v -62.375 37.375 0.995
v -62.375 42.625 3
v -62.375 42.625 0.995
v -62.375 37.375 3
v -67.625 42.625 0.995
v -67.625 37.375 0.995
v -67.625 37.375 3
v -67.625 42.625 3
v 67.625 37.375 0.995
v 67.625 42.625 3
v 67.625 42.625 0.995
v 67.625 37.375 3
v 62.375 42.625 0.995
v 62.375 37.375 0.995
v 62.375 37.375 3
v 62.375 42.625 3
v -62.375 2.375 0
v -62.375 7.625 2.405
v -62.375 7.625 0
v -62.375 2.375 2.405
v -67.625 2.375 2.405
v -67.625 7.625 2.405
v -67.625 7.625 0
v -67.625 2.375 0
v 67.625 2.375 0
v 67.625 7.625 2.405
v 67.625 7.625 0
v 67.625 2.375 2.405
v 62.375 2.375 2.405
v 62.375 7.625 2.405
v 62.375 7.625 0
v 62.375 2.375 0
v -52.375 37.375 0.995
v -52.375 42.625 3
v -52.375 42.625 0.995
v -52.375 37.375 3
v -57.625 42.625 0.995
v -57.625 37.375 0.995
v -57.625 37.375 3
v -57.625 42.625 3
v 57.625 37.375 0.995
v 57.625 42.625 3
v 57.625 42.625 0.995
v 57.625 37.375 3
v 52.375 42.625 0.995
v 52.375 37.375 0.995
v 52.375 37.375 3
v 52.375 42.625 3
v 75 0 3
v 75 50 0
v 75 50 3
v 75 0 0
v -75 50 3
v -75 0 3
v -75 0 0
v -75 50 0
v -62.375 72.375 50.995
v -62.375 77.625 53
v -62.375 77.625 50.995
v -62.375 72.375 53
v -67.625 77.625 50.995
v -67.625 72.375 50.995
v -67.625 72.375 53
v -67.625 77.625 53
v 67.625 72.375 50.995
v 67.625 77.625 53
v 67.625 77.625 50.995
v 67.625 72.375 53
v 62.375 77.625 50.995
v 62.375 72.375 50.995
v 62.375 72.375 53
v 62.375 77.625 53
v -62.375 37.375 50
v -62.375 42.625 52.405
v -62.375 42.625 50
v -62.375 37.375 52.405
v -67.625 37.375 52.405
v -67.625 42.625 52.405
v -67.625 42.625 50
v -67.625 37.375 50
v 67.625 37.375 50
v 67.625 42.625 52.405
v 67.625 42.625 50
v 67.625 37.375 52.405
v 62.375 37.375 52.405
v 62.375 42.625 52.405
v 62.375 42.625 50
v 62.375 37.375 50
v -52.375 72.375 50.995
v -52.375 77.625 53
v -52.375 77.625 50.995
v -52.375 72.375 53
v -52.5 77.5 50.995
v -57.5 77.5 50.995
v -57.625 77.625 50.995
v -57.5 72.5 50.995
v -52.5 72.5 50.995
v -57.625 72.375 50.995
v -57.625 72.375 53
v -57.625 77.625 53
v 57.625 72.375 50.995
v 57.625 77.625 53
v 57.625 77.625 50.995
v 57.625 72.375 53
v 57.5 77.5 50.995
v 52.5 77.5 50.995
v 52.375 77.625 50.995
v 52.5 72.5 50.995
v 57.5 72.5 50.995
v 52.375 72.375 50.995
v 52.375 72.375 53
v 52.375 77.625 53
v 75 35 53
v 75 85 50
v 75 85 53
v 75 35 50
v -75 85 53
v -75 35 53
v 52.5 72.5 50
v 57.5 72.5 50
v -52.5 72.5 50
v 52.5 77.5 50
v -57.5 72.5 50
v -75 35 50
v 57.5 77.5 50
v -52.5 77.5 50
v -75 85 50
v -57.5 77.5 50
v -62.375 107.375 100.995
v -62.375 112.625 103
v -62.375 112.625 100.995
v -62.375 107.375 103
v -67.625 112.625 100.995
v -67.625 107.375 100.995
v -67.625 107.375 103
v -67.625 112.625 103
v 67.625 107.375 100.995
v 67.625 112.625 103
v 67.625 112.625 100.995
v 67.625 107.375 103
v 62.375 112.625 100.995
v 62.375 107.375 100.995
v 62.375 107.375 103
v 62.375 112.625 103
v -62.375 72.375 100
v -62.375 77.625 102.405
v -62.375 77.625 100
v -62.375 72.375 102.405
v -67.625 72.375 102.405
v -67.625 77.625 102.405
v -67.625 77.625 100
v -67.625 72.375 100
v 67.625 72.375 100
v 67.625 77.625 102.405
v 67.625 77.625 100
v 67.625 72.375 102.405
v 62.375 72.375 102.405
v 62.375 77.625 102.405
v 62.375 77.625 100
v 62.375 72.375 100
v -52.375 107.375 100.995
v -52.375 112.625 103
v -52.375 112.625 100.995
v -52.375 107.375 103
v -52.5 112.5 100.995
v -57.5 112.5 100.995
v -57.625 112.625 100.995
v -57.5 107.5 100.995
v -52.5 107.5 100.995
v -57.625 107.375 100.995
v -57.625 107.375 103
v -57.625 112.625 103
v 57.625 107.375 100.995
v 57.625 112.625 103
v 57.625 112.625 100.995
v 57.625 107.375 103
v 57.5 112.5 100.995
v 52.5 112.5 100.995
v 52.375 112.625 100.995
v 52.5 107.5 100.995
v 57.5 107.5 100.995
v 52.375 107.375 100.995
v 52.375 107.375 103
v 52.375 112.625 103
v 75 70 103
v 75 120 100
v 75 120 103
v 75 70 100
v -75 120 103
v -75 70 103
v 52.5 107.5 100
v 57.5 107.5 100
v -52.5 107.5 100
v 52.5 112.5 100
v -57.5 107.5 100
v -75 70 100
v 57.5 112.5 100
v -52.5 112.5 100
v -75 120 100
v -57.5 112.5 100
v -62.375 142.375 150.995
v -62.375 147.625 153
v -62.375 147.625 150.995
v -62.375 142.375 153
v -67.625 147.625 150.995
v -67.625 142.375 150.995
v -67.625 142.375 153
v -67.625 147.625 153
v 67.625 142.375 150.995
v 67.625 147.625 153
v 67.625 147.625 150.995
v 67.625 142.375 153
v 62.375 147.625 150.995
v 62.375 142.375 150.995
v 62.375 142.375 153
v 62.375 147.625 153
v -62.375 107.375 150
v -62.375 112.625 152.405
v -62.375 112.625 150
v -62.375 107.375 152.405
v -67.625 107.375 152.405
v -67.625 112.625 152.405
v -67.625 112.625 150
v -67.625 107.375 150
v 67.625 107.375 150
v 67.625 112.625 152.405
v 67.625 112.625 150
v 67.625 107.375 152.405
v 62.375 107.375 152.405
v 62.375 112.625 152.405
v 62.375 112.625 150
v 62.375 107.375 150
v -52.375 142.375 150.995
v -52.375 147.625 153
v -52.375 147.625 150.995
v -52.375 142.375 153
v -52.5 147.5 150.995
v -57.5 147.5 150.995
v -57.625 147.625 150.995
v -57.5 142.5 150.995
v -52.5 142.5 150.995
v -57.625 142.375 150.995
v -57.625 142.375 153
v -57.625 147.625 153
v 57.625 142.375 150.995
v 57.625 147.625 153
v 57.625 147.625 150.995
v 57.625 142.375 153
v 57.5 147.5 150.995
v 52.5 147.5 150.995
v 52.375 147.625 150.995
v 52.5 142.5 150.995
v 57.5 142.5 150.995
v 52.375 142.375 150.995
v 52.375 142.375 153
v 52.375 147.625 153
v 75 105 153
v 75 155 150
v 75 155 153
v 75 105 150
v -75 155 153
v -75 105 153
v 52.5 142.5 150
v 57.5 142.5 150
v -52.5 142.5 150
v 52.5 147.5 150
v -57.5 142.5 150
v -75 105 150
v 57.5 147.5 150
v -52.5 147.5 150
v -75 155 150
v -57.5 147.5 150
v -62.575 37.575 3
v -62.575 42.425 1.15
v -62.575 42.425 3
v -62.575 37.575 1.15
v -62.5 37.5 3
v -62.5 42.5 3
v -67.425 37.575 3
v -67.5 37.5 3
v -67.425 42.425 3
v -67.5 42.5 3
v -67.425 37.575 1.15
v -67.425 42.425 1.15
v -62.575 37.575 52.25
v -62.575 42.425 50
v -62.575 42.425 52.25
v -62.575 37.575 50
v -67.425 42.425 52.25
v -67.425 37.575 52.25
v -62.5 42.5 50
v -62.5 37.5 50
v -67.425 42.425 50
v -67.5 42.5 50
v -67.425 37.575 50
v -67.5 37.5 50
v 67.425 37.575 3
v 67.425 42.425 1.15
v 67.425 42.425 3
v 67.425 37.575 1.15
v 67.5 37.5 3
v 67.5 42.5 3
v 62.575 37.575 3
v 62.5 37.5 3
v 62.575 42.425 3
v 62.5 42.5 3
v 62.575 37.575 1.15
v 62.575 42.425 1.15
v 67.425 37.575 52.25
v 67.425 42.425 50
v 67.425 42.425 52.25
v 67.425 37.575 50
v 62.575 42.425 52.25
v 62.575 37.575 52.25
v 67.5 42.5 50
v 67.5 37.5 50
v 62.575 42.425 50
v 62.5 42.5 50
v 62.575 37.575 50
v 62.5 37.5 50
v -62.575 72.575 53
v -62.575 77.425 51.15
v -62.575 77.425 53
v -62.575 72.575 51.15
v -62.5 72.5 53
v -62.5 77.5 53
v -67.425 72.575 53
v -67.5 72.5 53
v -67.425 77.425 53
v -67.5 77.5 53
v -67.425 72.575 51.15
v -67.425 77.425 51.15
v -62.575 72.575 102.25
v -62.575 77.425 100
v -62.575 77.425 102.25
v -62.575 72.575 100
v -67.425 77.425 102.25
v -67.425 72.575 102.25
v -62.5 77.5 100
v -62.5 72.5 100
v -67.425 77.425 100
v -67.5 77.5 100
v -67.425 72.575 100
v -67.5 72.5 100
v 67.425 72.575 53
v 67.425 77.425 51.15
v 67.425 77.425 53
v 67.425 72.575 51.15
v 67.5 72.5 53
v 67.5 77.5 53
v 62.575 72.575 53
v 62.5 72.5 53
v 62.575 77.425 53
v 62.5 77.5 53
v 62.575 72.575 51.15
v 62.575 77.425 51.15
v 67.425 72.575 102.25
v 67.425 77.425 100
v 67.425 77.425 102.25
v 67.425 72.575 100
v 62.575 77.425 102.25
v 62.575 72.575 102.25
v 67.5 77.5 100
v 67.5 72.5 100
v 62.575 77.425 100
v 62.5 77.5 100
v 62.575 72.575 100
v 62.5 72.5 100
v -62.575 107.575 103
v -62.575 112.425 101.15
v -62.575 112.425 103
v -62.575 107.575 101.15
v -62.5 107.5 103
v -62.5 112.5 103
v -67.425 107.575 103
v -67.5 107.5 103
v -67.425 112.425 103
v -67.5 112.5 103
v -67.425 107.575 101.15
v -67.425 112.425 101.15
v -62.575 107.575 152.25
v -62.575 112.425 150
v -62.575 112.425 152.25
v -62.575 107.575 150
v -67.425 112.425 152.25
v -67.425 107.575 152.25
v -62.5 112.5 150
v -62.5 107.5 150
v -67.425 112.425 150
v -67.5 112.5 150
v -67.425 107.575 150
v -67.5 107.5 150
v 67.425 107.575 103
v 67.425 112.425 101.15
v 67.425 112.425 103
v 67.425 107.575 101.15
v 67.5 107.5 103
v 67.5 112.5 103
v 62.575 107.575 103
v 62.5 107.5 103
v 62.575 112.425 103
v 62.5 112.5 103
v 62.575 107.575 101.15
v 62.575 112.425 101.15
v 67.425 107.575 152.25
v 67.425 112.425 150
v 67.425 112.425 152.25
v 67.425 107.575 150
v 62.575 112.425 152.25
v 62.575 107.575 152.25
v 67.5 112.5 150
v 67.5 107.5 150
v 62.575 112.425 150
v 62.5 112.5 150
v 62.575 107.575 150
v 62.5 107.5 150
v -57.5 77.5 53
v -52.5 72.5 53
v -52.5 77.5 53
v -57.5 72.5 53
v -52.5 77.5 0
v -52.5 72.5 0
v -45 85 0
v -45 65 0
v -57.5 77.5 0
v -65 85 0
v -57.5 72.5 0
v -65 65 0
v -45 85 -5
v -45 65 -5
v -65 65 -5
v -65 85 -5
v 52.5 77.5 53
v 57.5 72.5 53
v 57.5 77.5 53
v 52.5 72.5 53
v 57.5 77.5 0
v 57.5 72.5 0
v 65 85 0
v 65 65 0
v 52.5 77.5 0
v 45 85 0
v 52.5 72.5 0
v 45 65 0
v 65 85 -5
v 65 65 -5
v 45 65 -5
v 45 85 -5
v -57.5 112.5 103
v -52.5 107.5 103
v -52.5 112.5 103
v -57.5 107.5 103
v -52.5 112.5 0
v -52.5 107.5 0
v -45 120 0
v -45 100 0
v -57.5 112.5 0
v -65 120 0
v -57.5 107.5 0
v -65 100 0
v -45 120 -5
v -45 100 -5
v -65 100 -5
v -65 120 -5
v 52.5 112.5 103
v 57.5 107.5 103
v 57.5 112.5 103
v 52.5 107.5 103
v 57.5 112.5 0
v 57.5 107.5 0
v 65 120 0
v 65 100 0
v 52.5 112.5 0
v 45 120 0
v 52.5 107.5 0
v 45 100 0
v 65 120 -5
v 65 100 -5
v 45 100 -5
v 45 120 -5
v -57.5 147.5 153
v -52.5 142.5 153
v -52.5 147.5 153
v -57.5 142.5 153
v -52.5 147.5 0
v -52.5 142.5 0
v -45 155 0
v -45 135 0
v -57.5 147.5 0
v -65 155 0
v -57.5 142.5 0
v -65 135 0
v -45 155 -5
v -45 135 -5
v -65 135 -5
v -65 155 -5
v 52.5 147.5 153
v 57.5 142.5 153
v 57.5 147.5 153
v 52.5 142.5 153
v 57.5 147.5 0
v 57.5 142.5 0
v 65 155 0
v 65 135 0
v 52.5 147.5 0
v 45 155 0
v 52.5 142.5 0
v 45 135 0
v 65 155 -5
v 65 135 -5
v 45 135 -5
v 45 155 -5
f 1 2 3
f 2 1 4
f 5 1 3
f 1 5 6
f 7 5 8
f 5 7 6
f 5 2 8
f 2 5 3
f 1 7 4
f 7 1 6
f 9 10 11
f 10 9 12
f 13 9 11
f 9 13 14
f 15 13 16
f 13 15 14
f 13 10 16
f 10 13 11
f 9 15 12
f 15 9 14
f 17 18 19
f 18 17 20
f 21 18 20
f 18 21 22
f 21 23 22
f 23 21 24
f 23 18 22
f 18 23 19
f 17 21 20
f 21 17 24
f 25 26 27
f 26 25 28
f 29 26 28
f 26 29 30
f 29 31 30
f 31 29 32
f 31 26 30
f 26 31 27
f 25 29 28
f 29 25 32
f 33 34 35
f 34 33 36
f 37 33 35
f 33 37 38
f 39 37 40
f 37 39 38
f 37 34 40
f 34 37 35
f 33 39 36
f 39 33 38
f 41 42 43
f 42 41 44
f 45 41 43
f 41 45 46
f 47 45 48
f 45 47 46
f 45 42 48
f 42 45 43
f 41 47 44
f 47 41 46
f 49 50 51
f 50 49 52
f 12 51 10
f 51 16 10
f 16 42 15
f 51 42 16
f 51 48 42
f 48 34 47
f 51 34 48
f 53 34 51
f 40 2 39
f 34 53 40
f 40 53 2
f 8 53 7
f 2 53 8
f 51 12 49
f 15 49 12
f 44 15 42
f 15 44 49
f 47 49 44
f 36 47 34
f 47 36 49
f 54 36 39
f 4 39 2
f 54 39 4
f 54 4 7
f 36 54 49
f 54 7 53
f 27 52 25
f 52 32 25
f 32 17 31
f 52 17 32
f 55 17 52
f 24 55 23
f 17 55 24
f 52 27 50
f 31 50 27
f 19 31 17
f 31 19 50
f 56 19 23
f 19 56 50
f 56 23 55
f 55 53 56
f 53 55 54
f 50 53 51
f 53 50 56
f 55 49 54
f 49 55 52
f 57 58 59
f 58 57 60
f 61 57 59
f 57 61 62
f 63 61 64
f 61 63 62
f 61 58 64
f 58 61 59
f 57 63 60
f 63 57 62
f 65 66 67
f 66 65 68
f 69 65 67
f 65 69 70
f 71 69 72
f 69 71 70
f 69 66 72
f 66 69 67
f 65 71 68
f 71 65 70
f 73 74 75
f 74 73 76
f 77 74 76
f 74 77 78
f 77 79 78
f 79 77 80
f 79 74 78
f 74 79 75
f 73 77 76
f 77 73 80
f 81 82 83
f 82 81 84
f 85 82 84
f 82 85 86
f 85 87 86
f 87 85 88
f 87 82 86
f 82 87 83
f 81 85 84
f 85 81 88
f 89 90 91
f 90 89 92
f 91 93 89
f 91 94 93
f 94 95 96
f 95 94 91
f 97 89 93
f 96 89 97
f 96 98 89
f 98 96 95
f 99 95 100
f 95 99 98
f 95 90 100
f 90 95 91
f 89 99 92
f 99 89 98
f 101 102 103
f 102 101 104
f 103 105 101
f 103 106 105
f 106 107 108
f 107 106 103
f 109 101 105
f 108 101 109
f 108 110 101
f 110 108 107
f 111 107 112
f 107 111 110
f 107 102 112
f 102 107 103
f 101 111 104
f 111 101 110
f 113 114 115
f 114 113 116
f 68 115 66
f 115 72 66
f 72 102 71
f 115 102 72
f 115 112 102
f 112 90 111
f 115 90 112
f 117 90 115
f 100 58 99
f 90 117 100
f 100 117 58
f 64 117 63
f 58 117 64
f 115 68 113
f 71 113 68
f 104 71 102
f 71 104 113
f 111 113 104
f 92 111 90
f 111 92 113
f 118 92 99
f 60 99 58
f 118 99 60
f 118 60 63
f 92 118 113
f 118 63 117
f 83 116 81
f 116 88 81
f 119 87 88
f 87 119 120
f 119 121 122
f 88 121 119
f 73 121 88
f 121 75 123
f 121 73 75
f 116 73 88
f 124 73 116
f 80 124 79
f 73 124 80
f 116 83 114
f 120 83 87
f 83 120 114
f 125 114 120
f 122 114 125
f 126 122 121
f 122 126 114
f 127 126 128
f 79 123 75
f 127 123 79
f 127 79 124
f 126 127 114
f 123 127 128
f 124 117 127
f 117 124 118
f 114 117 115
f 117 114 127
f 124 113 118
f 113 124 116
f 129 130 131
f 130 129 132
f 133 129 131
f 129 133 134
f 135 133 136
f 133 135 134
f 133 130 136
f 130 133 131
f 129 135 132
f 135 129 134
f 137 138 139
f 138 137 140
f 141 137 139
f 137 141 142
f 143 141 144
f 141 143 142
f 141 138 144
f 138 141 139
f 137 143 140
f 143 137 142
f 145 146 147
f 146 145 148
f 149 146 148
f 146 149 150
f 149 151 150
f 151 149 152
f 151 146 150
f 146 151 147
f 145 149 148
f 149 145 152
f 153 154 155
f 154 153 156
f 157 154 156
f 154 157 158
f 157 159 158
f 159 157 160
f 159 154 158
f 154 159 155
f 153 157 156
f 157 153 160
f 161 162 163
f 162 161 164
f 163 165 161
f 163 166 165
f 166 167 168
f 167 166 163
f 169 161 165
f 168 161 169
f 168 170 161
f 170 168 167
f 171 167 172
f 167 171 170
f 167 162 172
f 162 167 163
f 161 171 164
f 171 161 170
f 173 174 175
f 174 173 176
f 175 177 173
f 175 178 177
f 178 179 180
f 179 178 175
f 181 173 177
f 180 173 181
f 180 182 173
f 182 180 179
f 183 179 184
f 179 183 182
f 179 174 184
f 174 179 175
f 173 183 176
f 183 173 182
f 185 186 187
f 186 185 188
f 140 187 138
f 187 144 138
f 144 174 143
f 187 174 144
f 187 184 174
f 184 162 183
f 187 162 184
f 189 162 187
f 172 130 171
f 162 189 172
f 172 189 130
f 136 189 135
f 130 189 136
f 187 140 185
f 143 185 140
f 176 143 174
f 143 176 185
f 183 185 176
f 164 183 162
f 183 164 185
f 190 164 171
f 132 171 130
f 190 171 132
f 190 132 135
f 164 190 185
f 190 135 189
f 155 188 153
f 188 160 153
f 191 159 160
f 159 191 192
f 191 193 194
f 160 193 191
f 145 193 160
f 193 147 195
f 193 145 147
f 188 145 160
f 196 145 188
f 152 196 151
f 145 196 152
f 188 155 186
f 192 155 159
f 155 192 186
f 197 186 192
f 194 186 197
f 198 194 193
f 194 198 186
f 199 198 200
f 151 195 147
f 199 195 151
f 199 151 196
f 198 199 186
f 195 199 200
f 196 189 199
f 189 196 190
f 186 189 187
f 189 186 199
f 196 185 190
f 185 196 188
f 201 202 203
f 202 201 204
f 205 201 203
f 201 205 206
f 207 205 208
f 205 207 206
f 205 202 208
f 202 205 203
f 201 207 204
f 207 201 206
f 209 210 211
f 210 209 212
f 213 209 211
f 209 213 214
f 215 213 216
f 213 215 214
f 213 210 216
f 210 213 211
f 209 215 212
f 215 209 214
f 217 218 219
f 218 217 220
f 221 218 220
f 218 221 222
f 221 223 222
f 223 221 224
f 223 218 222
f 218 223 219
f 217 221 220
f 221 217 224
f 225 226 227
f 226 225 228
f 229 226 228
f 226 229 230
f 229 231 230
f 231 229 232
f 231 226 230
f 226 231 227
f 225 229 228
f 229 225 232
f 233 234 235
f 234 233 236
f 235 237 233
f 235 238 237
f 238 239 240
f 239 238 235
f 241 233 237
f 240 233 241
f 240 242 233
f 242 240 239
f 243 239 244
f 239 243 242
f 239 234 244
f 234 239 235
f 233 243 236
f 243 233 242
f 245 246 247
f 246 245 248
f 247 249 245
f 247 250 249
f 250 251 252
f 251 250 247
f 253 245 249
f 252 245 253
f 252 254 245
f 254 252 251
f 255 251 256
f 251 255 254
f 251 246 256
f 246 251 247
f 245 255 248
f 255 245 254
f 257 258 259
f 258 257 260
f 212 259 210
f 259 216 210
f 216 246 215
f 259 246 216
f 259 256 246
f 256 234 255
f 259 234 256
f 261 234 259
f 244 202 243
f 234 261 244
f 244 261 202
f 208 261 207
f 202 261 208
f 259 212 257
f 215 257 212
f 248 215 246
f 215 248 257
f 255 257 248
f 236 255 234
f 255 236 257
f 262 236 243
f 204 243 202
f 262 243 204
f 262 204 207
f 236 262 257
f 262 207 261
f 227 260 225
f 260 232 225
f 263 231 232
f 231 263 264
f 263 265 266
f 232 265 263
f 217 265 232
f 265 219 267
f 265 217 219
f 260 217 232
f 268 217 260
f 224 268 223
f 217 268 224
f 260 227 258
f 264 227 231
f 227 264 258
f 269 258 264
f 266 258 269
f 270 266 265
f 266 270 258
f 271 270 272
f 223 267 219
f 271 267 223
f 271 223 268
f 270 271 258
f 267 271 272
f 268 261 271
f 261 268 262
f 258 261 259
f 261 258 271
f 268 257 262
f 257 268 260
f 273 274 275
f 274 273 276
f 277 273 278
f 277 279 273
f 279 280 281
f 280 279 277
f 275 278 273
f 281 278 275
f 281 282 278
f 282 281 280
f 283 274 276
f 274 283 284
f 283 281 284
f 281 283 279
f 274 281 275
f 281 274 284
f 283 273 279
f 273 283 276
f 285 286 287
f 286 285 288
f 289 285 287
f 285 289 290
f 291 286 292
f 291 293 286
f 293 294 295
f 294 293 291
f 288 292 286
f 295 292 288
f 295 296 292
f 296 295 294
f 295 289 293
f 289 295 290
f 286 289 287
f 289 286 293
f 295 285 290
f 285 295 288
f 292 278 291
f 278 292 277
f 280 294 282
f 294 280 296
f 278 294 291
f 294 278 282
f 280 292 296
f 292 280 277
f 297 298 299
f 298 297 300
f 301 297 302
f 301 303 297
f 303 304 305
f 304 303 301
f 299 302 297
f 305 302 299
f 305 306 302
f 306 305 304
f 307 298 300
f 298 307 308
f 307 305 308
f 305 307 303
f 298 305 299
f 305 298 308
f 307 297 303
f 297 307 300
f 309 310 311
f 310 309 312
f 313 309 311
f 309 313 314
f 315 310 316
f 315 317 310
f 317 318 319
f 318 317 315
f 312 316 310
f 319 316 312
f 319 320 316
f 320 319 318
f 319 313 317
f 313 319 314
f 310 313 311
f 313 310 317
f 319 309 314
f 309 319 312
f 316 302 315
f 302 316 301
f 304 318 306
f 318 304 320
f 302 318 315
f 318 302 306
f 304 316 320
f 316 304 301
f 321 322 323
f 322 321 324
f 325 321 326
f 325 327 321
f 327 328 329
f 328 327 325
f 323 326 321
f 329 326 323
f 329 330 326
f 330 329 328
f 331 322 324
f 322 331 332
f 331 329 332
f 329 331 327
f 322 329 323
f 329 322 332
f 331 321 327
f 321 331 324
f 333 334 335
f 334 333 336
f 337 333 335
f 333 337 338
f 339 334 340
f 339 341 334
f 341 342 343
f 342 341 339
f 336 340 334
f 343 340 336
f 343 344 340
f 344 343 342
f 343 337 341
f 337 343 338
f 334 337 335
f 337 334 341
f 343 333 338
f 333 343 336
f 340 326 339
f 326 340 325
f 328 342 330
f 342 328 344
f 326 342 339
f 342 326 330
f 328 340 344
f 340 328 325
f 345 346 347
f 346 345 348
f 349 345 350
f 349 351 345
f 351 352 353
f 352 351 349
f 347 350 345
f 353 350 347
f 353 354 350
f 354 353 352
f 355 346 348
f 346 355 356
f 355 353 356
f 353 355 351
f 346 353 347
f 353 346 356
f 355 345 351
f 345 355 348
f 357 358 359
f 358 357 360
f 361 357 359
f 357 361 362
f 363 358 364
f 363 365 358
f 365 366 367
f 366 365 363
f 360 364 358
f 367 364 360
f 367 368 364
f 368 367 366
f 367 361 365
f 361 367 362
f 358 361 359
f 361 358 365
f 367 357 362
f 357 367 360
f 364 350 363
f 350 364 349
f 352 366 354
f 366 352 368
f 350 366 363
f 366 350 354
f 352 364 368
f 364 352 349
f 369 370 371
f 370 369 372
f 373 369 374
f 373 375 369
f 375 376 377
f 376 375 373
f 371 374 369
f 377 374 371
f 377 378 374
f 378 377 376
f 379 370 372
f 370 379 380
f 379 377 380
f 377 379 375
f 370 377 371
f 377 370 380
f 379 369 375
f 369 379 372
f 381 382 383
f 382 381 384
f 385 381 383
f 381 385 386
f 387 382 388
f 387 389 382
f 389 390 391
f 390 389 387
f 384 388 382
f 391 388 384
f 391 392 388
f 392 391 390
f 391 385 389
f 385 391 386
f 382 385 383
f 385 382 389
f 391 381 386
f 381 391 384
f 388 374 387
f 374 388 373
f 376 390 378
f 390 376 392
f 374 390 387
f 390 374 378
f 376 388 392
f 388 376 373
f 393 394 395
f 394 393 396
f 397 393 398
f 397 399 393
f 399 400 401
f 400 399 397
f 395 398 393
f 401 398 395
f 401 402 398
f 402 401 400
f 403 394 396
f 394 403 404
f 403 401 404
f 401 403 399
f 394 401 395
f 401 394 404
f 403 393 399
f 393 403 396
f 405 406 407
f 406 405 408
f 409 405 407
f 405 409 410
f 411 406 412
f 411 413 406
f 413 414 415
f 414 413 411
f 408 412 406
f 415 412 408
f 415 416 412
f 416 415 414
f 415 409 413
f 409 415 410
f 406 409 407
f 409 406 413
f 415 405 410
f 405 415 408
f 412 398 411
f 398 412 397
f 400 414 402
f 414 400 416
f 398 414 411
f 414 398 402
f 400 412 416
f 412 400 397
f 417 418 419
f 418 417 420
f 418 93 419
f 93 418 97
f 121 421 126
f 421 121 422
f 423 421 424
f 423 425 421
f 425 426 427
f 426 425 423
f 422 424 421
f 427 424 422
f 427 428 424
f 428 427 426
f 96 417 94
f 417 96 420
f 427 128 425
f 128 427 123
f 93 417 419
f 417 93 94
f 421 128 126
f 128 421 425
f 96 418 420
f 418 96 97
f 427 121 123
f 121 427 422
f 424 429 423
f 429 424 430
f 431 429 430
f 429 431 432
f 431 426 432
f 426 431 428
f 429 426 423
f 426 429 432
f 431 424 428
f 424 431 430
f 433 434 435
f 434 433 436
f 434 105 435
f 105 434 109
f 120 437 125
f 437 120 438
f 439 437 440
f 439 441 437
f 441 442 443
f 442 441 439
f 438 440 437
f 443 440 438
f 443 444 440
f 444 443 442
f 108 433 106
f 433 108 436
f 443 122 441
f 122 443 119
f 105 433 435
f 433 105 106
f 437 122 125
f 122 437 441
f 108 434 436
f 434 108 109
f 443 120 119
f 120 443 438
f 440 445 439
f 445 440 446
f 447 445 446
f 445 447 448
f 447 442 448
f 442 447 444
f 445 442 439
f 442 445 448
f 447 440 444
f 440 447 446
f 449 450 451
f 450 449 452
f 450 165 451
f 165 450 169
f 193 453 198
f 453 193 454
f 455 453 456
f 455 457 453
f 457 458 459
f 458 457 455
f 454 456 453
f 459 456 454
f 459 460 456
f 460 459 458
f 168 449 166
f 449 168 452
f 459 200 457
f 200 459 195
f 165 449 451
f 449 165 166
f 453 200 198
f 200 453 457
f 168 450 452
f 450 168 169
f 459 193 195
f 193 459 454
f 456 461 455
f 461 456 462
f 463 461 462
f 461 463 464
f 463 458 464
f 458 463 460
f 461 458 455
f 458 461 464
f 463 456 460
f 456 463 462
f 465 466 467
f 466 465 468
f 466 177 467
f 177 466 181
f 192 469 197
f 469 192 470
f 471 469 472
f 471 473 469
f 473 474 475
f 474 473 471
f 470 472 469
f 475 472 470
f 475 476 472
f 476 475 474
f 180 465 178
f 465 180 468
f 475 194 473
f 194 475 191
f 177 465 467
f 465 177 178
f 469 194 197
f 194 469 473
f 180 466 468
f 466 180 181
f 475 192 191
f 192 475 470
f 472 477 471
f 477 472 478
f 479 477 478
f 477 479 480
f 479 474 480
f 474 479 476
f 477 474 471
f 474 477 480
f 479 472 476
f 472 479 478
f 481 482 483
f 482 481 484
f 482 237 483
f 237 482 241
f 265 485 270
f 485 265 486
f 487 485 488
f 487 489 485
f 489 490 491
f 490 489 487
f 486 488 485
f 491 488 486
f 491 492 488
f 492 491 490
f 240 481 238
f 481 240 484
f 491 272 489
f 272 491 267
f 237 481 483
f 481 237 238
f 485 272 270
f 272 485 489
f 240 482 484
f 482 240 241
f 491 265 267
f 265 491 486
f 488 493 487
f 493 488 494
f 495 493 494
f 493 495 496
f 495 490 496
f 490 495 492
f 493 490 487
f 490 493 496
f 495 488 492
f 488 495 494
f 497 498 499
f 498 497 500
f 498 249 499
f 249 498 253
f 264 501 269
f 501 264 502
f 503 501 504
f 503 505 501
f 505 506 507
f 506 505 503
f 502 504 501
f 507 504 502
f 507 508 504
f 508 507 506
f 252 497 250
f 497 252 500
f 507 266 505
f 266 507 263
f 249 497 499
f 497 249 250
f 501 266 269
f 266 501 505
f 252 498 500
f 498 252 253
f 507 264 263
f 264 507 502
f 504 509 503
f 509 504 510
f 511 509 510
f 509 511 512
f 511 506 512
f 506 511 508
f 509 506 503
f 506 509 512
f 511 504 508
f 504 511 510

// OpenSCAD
/*
Parametric Mini Display Shelf System (Simplified)
Author: Codex

Design goals:
- very simple geometry
- easy to print on home FDM printers
- fully parametric system for multiple scales

System parts:
1) shelf_panel : flat shelf with sockets
2) riser_post  : straight post between shelf levels
3) ground_leg  : straight leg from shelf level to table

All parts are box-based and support-free in default print orientation.
*/

// -----------------------------
// View / Modes
// -----------------------------

view_mode = "assembly";
// "assembly", "shelf_panel", "riser_post", "ground_leg", "ground_legs_set", "all_parts"

preview_fast = true;
$fn = preview_fast ? 24 : 64;

part_print_orientation = true; // auto-orient single parts for support-free printing
explode = 0; // assembly-only spacing

// Used by "ground_leg" mode to pick one leg length.
ground_leg_preview_level = 3;

// -----------------------------
// Main Parameters
// -----------------------------

scale_preset = "custom"; // "custom", "lego_minifig", "cars_1_64", "miniatures_32mm"
levels = 4; // >=2

// Used when scale_preset == "custom"
shelf_width_custom = 150;
shelf_depth_custom = 50;
run_pitch_custom = 35;   // horizontal step offset between levels
level_pitch_custom = 50; // vertical offset between levels

shelf_thickness = 3.0;

// Socket layout
rear_socket_offset = 10; // distance from rear edge for top sockets
step_socket_side_inset = 10;
leg_socket_side_inset = 20;

// Connector fit
peg_x = 5.0;
peg_y = 5.0;
peg_tolerance = 0.15;
socket_clearance = 0.25;
top_socket_depth = 2.0;
bottom_socket_depth = 2.4;

// Straight riser post
riser_body_width = 5;
riser_body_depth = 5;

// Ground legs (to table)
add_ground_legs = true;
ground_legs_all_levels = true;   // true: one pair per upper level
ground_legs_include_level0 = false; // include base level too
ground_leg_setback = 0;          // 0 = vertical, >0 leans backwards
ground_leg_width = 5;
ground_leg_depth = 5;
ground_leg_foot_width = 20;
ground_leg_foot_depth = 20;
ground_leg_foot_height = 5;

// -----------------------------
// Presets
// -----------------------------

function use_preset() = scale_preset != "custom";

function preset_width(p) =
    p == "lego_minifig" ? 200 :
    p == "cars_1_64" ? 220 :
    p == "miniatures_32mm" ? 190 :
    shelf_width_custom;

function preset_depth(p) =
    p == "lego_minifig" ? 72 :
    p == "cars_1_64" ? 78 :
    p == "miniatures_32mm" ? 80 :
    shelf_depth_custom;

function preset_run_pitch(p) =
    p == "lego_minifig" ? 38 :
    p == "cars_1_64" ? 42 :
    p == "miniatures_32mm" ? 40 :
    run_pitch_custom;

function preset_level_pitch(p) =
    p == "lego_minifig" ? 46 :
    p == "cars_1_64" ? 38 :
    p == "miniatures_32mm" ? 52 :
    level_pitch_custom;

shelf_width = use_preset() ? preset_width(scale_preset) : shelf_width_custom;
shelf_depth = use_preset() ? preset_depth(scale_preset) : shelf_depth_custom;
run_pitch = use_preset() ? preset_run_pitch(scale_preset) : run_pitch_custom;
level_pitch = use_preset() ? preset_level_pitch(scale_preset) : level_pitch_custom;

// -----------------------------
// Derived Geometry
// -----------------------------

function x_step_sockets() = [-(shelf_width / 2 - step_socket_side_inset), (shelf_width / 2 - step_socket_side_inset)];
function x_leg_sockets() = [-(shelf_width / 2 - leg_socket_side_inset), (shelf_width / 2 - leg_socket_side_inset)];

step_socket_top_y = shelf_depth - rear_socket_offset;
step_socket_bottom_y = step_socket_top_y - run_pitch; // enables straight riser posts (dy=0)
leg_socket_top_y = step_socket_top_y;

socket_w = peg_x + socket_clearance;
socket_d = peg_y + socket_clearance;
peg_w = peg_x - peg_tolerance;
peg_d = peg_y - peg_tolerance;

riser_dz = level_pitch - shelf_thickness;

run_pitch_view = run_pitch + explode;
level_pitch_view = level_pitch + explode;
riser_dz_view = level_pitch_view - shelf_thickness;

leg_start_level = ground_legs_all_levels ? (ground_legs_include_level0 ? 0 : 1) : (levels - 1);
leg_levels_count = levels - leg_start_level;
min_leg_drop = leg_start_level * level_pitch + shelf_thickness;
preview_leg_level = max(0, min(ground_leg_preview_level, levels - 1));
preview_leg_drop = preview_leg_level * level_pitch + shelf_thickness;

// -----------------------------
// Sanity Checks
// -----------------------------

assert(levels >= 2, "levels must be >= 2");
assert(shelf_thickness > 1, "shelf_thickness must be > 1");
assert(top_socket_depth > 0 && top_socket_depth < shelf_thickness, "top_socket_depth must be inside shelf thickness");
assert(bottom_socket_depth > 0 && bottom_socket_depth < shelf_thickness, "bottom_socket_depth must be inside shelf thickness");
assert(step_socket_side_inset + socket_w / 2 < shelf_width / 2, "step_socket_side_inset is out of bounds");
assert(leg_socket_side_inset + socket_w / 2 < shelf_width / 2, "leg_socket_side_inset is out of bounds");
assert(leg_socket_side_inset > step_socket_side_inset + socket_w + 0.8,
    "Increase leg_socket_side_inset to separate leg sockets from riser sockets");
assert(step_socket_top_y > socket_d / 2 && step_socket_top_y < shelf_depth - socket_d / 2,
    "rear_socket_offset gives invalid top socket position");
assert(step_socket_bottom_y > socket_d / 2 && step_socket_bottom_y < shelf_depth - socket_d / 2,
    "run_pitch is too large for straight risers (bottom socket row out of shelf bounds)");
assert(level_pitch > shelf_thickness + 2, "level_pitch too small relative to shelf_thickness");
assert(riser_dz > max(top_socket_depth, bottom_socket_depth),
    "Increase level_pitch or reduce socket depths");
assert(!add_ground_legs || leg_start_level < levels, "No levels selected for ground legs");
assert(!add_ground_legs || min_leg_drop > (ground_leg_foot_height + 2),
    "Leg drop too short for current leg settings");

// -----------------------------
// Bill of Materials (echo)
// -----------------------------

function riser_post_count() = 2 * (levels - 1);
function ground_leg_count() = add_ground_legs ? 2 * leg_levels_count : 0;

echo(str("Preset: ", scale_preset));
echo(str("levels: ", levels));
echo(str("shelf_panel x", levels));
echo(str("riser_post x", riser_post_count()));
echo(str("ground_leg x", ground_leg_count()));
echo(str("leg levels: ", leg_start_level, " to ", levels - 1));

// -----------------------------
// Primitives
// -----------------------------

eps = 0.01;

module peg_up(len) {
    translate([0, 0, len / 2]) cube([peg_w, peg_d, len], center = true);
}

module peg_down(len) {
    translate([0, 0, -len / 2]) cube([peg_w, peg_d, len], center = true);
}

module socket_cut(depth) {
    cube([socket_w, socket_d, depth + eps], center = true);
}

// -----------------------------
// Parts
// -----------------------------

module shelf_panel() {
    difference() {
        translate([-shelf_width / 2, 0, 0]) cube([shelf_width, shelf_depth, shelf_thickness]);

        // Top sockets for risers to the next level
        for (x = x_step_sockets()) {
            translate([x, step_socket_top_y, shelf_thickness - top_socket_depth / 2]) socket_cut(top_socket_depth);
        }

        // Bottom sockets for risers from the previous level
        for (x = x_step_sockets()) {
            translate([x, step_socket_bottom_y, bottom_socket_depth / 2]) socket_cut(bottom_socket_depth);
        }

        // Dedicated top sockets for ground legs
        for (x = x_leg_sockets()) {
            translate([x, leg_socket_top_y, shelf_thickness - top_socket_depth / 2]) socket_cut(top_socket_depth);
        }
    }
}

module riser_post(dz = riser_dz) {
    union() {
        // Lower peg goes into top socket of lower shelf
        peg_down(top_socket_depth - 0.15);

        // Upper peg goes into bottom socket of upper shelf
        translate([0, 0, dz]) peg_up(bottom_socket_depth - 0.15);

        // Straight body
        translate([0, 0, dz / 2]) cube([riser_body_width, riser_body_depth, dz], center = true);
    }
}

module ground_leg(drop = preview_leg_drop) {
    union() {
        // Peg goes into a top leg socket
        peg_down(top_socket_depth - 0.15);

        // Straight stem
        translate([0, ground_leg_setback, -drop / 2]) cube([ground_leg_width, ground_leg_depth, drop], center = true);

        // Table foot
        translate([0, ground_leg_setback, -drop - ground_leg_foot_height / 2])
            cube([ground_leg_foot_width, ground_leg_foot_depth, ground_leg_foot_height], center = true);
    }
}

// -----------------------------
// Print-Oriented Helpers
// -----------------------------

module riser_post_print() {
    translate([0, 0, riser_body_width / 2]) rotate([0, 90, 0]) riser_post();
}

module ground_leg_print(drop = preview_leg_drop) {
    // Lift so the foot sits on Z=0.
    translate([0, 0, drop + ground_leg_foot_height]) ground_leg(drop = drop);
}

module ground_legs_set_layout() {
    // One leg for each required level, laid out left-to-right.
    for (i = [leg_start_level : levels - 1]) {
        translate([(i - leg_start_level) * 35, 0, 0]) {
            if (part_print_orientation) {
                ground_leg_print(drop = i * level_pitch + shelf_thickness);
            } else {
                translate([0, 0, i * level_pitch + shelf_thickness]) ground_leg(drop = i * level_pitch + shelf_thickness);
            }
        }
    }
}

// -----------------------------
// Assembly
// -----------------------------

module assembly() {
    // Shelves
    for (i = [0 : levels - 1]) {
        color([0.52, 0.34, 0.18])
            translate([0, i * run_pitch_view, i * level_pitch_view])
                shelf_panel();
    }

    // Riser posts between levels (straight connectors)
    for (i = [0 : levels - 2]) {
        for (x = x_step_sockets()) {
            color([0.10, 0.10, 0.10])
                translate([x, i * run_pitch_view + step_socket_top_y, i * level_pitch_view + shelf_thickness])
                    riser_post(dz = riser_dz_view);
        }
    }

    // Ground legs for selected levels
    if (add_ground_legs) {
        for (i = [leg_start_level : levels - 1]) {
            for (x = x_leg_sockets()) {
                color([0.10, 0.10, 0.10])
                    translate([x, i * run_pitch_view + leg_socket_top_y, i * level_pitch_view + shelf_thickness])
                        ground_leg(drop = i * level_pitch_view + shelf_thickness);
            }
        }
    }
}

module all_parts_layout() {
    translate([0, 0, 0]) shelf_panel();

    if (part_print_orientation) {
        translate([0, shelf_depth + 30, 0]) riser_post_print();
        translate([45, shelf_depth + 30, 0]) ground_leg_print();
    } else {
        translate([0, shelf_depth + 30, 0]) riser_post();
        translate([45, shelf_depth + 30, preview_leg_drop]) ground_leg();
    }
}

// -----------------------------
// Mode Switch
// -----------------------------

if (view_mode == "assembly") {
    assembly();
} else if (view_mode == "shelf_panel") {
    shelf_panel();
} else if (view_mode == "riser_post") {
    if (part_print_orientation) riser_post_print(); else riser_post();
} else if (view_mode == "ground_leg") {
    if (part_print_orientation) ground_leg_print(); else translate([0, 0, preview_leg_drop]) ground_leg();
} else if (view_mode == "ground_legs_set") {
    ground_legs_set_layout();
} else if (view_mode == "all_parts") {
    all_parts_layout();
} else {
    echo("Unknown view_mode, falling back to assembly");
    assembly();
}
